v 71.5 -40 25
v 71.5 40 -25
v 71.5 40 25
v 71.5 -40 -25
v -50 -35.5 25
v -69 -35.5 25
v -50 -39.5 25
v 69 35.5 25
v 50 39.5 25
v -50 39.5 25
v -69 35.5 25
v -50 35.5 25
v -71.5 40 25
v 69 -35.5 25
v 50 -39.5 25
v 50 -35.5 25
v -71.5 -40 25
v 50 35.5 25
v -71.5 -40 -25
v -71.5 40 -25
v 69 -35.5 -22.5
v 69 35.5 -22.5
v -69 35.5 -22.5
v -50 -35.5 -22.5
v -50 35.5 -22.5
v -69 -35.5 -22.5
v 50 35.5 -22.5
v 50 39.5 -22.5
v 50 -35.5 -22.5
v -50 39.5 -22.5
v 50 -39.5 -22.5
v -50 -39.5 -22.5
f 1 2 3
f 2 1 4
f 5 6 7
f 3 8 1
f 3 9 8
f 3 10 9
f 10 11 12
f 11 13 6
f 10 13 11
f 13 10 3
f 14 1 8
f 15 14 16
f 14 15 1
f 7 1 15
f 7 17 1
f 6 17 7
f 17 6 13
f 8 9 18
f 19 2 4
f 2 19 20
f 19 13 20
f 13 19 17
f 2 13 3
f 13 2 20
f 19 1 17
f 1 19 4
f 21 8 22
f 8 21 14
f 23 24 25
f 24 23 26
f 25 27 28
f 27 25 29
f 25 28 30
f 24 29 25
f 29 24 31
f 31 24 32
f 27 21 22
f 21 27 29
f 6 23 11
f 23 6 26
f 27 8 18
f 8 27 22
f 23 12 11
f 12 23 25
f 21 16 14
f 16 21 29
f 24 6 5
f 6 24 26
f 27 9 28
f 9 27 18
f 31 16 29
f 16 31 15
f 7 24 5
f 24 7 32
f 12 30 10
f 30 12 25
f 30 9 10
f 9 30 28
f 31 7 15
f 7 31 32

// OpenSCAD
scale([1, 1]) difference() {
    cube(([143,80,50]), center = true);
    translate([0, 0, 3])
        cube(([138,71,51]), center = true);
     translate([0, 0, 3])
        cube(([100,79,51]), center = true);   }
